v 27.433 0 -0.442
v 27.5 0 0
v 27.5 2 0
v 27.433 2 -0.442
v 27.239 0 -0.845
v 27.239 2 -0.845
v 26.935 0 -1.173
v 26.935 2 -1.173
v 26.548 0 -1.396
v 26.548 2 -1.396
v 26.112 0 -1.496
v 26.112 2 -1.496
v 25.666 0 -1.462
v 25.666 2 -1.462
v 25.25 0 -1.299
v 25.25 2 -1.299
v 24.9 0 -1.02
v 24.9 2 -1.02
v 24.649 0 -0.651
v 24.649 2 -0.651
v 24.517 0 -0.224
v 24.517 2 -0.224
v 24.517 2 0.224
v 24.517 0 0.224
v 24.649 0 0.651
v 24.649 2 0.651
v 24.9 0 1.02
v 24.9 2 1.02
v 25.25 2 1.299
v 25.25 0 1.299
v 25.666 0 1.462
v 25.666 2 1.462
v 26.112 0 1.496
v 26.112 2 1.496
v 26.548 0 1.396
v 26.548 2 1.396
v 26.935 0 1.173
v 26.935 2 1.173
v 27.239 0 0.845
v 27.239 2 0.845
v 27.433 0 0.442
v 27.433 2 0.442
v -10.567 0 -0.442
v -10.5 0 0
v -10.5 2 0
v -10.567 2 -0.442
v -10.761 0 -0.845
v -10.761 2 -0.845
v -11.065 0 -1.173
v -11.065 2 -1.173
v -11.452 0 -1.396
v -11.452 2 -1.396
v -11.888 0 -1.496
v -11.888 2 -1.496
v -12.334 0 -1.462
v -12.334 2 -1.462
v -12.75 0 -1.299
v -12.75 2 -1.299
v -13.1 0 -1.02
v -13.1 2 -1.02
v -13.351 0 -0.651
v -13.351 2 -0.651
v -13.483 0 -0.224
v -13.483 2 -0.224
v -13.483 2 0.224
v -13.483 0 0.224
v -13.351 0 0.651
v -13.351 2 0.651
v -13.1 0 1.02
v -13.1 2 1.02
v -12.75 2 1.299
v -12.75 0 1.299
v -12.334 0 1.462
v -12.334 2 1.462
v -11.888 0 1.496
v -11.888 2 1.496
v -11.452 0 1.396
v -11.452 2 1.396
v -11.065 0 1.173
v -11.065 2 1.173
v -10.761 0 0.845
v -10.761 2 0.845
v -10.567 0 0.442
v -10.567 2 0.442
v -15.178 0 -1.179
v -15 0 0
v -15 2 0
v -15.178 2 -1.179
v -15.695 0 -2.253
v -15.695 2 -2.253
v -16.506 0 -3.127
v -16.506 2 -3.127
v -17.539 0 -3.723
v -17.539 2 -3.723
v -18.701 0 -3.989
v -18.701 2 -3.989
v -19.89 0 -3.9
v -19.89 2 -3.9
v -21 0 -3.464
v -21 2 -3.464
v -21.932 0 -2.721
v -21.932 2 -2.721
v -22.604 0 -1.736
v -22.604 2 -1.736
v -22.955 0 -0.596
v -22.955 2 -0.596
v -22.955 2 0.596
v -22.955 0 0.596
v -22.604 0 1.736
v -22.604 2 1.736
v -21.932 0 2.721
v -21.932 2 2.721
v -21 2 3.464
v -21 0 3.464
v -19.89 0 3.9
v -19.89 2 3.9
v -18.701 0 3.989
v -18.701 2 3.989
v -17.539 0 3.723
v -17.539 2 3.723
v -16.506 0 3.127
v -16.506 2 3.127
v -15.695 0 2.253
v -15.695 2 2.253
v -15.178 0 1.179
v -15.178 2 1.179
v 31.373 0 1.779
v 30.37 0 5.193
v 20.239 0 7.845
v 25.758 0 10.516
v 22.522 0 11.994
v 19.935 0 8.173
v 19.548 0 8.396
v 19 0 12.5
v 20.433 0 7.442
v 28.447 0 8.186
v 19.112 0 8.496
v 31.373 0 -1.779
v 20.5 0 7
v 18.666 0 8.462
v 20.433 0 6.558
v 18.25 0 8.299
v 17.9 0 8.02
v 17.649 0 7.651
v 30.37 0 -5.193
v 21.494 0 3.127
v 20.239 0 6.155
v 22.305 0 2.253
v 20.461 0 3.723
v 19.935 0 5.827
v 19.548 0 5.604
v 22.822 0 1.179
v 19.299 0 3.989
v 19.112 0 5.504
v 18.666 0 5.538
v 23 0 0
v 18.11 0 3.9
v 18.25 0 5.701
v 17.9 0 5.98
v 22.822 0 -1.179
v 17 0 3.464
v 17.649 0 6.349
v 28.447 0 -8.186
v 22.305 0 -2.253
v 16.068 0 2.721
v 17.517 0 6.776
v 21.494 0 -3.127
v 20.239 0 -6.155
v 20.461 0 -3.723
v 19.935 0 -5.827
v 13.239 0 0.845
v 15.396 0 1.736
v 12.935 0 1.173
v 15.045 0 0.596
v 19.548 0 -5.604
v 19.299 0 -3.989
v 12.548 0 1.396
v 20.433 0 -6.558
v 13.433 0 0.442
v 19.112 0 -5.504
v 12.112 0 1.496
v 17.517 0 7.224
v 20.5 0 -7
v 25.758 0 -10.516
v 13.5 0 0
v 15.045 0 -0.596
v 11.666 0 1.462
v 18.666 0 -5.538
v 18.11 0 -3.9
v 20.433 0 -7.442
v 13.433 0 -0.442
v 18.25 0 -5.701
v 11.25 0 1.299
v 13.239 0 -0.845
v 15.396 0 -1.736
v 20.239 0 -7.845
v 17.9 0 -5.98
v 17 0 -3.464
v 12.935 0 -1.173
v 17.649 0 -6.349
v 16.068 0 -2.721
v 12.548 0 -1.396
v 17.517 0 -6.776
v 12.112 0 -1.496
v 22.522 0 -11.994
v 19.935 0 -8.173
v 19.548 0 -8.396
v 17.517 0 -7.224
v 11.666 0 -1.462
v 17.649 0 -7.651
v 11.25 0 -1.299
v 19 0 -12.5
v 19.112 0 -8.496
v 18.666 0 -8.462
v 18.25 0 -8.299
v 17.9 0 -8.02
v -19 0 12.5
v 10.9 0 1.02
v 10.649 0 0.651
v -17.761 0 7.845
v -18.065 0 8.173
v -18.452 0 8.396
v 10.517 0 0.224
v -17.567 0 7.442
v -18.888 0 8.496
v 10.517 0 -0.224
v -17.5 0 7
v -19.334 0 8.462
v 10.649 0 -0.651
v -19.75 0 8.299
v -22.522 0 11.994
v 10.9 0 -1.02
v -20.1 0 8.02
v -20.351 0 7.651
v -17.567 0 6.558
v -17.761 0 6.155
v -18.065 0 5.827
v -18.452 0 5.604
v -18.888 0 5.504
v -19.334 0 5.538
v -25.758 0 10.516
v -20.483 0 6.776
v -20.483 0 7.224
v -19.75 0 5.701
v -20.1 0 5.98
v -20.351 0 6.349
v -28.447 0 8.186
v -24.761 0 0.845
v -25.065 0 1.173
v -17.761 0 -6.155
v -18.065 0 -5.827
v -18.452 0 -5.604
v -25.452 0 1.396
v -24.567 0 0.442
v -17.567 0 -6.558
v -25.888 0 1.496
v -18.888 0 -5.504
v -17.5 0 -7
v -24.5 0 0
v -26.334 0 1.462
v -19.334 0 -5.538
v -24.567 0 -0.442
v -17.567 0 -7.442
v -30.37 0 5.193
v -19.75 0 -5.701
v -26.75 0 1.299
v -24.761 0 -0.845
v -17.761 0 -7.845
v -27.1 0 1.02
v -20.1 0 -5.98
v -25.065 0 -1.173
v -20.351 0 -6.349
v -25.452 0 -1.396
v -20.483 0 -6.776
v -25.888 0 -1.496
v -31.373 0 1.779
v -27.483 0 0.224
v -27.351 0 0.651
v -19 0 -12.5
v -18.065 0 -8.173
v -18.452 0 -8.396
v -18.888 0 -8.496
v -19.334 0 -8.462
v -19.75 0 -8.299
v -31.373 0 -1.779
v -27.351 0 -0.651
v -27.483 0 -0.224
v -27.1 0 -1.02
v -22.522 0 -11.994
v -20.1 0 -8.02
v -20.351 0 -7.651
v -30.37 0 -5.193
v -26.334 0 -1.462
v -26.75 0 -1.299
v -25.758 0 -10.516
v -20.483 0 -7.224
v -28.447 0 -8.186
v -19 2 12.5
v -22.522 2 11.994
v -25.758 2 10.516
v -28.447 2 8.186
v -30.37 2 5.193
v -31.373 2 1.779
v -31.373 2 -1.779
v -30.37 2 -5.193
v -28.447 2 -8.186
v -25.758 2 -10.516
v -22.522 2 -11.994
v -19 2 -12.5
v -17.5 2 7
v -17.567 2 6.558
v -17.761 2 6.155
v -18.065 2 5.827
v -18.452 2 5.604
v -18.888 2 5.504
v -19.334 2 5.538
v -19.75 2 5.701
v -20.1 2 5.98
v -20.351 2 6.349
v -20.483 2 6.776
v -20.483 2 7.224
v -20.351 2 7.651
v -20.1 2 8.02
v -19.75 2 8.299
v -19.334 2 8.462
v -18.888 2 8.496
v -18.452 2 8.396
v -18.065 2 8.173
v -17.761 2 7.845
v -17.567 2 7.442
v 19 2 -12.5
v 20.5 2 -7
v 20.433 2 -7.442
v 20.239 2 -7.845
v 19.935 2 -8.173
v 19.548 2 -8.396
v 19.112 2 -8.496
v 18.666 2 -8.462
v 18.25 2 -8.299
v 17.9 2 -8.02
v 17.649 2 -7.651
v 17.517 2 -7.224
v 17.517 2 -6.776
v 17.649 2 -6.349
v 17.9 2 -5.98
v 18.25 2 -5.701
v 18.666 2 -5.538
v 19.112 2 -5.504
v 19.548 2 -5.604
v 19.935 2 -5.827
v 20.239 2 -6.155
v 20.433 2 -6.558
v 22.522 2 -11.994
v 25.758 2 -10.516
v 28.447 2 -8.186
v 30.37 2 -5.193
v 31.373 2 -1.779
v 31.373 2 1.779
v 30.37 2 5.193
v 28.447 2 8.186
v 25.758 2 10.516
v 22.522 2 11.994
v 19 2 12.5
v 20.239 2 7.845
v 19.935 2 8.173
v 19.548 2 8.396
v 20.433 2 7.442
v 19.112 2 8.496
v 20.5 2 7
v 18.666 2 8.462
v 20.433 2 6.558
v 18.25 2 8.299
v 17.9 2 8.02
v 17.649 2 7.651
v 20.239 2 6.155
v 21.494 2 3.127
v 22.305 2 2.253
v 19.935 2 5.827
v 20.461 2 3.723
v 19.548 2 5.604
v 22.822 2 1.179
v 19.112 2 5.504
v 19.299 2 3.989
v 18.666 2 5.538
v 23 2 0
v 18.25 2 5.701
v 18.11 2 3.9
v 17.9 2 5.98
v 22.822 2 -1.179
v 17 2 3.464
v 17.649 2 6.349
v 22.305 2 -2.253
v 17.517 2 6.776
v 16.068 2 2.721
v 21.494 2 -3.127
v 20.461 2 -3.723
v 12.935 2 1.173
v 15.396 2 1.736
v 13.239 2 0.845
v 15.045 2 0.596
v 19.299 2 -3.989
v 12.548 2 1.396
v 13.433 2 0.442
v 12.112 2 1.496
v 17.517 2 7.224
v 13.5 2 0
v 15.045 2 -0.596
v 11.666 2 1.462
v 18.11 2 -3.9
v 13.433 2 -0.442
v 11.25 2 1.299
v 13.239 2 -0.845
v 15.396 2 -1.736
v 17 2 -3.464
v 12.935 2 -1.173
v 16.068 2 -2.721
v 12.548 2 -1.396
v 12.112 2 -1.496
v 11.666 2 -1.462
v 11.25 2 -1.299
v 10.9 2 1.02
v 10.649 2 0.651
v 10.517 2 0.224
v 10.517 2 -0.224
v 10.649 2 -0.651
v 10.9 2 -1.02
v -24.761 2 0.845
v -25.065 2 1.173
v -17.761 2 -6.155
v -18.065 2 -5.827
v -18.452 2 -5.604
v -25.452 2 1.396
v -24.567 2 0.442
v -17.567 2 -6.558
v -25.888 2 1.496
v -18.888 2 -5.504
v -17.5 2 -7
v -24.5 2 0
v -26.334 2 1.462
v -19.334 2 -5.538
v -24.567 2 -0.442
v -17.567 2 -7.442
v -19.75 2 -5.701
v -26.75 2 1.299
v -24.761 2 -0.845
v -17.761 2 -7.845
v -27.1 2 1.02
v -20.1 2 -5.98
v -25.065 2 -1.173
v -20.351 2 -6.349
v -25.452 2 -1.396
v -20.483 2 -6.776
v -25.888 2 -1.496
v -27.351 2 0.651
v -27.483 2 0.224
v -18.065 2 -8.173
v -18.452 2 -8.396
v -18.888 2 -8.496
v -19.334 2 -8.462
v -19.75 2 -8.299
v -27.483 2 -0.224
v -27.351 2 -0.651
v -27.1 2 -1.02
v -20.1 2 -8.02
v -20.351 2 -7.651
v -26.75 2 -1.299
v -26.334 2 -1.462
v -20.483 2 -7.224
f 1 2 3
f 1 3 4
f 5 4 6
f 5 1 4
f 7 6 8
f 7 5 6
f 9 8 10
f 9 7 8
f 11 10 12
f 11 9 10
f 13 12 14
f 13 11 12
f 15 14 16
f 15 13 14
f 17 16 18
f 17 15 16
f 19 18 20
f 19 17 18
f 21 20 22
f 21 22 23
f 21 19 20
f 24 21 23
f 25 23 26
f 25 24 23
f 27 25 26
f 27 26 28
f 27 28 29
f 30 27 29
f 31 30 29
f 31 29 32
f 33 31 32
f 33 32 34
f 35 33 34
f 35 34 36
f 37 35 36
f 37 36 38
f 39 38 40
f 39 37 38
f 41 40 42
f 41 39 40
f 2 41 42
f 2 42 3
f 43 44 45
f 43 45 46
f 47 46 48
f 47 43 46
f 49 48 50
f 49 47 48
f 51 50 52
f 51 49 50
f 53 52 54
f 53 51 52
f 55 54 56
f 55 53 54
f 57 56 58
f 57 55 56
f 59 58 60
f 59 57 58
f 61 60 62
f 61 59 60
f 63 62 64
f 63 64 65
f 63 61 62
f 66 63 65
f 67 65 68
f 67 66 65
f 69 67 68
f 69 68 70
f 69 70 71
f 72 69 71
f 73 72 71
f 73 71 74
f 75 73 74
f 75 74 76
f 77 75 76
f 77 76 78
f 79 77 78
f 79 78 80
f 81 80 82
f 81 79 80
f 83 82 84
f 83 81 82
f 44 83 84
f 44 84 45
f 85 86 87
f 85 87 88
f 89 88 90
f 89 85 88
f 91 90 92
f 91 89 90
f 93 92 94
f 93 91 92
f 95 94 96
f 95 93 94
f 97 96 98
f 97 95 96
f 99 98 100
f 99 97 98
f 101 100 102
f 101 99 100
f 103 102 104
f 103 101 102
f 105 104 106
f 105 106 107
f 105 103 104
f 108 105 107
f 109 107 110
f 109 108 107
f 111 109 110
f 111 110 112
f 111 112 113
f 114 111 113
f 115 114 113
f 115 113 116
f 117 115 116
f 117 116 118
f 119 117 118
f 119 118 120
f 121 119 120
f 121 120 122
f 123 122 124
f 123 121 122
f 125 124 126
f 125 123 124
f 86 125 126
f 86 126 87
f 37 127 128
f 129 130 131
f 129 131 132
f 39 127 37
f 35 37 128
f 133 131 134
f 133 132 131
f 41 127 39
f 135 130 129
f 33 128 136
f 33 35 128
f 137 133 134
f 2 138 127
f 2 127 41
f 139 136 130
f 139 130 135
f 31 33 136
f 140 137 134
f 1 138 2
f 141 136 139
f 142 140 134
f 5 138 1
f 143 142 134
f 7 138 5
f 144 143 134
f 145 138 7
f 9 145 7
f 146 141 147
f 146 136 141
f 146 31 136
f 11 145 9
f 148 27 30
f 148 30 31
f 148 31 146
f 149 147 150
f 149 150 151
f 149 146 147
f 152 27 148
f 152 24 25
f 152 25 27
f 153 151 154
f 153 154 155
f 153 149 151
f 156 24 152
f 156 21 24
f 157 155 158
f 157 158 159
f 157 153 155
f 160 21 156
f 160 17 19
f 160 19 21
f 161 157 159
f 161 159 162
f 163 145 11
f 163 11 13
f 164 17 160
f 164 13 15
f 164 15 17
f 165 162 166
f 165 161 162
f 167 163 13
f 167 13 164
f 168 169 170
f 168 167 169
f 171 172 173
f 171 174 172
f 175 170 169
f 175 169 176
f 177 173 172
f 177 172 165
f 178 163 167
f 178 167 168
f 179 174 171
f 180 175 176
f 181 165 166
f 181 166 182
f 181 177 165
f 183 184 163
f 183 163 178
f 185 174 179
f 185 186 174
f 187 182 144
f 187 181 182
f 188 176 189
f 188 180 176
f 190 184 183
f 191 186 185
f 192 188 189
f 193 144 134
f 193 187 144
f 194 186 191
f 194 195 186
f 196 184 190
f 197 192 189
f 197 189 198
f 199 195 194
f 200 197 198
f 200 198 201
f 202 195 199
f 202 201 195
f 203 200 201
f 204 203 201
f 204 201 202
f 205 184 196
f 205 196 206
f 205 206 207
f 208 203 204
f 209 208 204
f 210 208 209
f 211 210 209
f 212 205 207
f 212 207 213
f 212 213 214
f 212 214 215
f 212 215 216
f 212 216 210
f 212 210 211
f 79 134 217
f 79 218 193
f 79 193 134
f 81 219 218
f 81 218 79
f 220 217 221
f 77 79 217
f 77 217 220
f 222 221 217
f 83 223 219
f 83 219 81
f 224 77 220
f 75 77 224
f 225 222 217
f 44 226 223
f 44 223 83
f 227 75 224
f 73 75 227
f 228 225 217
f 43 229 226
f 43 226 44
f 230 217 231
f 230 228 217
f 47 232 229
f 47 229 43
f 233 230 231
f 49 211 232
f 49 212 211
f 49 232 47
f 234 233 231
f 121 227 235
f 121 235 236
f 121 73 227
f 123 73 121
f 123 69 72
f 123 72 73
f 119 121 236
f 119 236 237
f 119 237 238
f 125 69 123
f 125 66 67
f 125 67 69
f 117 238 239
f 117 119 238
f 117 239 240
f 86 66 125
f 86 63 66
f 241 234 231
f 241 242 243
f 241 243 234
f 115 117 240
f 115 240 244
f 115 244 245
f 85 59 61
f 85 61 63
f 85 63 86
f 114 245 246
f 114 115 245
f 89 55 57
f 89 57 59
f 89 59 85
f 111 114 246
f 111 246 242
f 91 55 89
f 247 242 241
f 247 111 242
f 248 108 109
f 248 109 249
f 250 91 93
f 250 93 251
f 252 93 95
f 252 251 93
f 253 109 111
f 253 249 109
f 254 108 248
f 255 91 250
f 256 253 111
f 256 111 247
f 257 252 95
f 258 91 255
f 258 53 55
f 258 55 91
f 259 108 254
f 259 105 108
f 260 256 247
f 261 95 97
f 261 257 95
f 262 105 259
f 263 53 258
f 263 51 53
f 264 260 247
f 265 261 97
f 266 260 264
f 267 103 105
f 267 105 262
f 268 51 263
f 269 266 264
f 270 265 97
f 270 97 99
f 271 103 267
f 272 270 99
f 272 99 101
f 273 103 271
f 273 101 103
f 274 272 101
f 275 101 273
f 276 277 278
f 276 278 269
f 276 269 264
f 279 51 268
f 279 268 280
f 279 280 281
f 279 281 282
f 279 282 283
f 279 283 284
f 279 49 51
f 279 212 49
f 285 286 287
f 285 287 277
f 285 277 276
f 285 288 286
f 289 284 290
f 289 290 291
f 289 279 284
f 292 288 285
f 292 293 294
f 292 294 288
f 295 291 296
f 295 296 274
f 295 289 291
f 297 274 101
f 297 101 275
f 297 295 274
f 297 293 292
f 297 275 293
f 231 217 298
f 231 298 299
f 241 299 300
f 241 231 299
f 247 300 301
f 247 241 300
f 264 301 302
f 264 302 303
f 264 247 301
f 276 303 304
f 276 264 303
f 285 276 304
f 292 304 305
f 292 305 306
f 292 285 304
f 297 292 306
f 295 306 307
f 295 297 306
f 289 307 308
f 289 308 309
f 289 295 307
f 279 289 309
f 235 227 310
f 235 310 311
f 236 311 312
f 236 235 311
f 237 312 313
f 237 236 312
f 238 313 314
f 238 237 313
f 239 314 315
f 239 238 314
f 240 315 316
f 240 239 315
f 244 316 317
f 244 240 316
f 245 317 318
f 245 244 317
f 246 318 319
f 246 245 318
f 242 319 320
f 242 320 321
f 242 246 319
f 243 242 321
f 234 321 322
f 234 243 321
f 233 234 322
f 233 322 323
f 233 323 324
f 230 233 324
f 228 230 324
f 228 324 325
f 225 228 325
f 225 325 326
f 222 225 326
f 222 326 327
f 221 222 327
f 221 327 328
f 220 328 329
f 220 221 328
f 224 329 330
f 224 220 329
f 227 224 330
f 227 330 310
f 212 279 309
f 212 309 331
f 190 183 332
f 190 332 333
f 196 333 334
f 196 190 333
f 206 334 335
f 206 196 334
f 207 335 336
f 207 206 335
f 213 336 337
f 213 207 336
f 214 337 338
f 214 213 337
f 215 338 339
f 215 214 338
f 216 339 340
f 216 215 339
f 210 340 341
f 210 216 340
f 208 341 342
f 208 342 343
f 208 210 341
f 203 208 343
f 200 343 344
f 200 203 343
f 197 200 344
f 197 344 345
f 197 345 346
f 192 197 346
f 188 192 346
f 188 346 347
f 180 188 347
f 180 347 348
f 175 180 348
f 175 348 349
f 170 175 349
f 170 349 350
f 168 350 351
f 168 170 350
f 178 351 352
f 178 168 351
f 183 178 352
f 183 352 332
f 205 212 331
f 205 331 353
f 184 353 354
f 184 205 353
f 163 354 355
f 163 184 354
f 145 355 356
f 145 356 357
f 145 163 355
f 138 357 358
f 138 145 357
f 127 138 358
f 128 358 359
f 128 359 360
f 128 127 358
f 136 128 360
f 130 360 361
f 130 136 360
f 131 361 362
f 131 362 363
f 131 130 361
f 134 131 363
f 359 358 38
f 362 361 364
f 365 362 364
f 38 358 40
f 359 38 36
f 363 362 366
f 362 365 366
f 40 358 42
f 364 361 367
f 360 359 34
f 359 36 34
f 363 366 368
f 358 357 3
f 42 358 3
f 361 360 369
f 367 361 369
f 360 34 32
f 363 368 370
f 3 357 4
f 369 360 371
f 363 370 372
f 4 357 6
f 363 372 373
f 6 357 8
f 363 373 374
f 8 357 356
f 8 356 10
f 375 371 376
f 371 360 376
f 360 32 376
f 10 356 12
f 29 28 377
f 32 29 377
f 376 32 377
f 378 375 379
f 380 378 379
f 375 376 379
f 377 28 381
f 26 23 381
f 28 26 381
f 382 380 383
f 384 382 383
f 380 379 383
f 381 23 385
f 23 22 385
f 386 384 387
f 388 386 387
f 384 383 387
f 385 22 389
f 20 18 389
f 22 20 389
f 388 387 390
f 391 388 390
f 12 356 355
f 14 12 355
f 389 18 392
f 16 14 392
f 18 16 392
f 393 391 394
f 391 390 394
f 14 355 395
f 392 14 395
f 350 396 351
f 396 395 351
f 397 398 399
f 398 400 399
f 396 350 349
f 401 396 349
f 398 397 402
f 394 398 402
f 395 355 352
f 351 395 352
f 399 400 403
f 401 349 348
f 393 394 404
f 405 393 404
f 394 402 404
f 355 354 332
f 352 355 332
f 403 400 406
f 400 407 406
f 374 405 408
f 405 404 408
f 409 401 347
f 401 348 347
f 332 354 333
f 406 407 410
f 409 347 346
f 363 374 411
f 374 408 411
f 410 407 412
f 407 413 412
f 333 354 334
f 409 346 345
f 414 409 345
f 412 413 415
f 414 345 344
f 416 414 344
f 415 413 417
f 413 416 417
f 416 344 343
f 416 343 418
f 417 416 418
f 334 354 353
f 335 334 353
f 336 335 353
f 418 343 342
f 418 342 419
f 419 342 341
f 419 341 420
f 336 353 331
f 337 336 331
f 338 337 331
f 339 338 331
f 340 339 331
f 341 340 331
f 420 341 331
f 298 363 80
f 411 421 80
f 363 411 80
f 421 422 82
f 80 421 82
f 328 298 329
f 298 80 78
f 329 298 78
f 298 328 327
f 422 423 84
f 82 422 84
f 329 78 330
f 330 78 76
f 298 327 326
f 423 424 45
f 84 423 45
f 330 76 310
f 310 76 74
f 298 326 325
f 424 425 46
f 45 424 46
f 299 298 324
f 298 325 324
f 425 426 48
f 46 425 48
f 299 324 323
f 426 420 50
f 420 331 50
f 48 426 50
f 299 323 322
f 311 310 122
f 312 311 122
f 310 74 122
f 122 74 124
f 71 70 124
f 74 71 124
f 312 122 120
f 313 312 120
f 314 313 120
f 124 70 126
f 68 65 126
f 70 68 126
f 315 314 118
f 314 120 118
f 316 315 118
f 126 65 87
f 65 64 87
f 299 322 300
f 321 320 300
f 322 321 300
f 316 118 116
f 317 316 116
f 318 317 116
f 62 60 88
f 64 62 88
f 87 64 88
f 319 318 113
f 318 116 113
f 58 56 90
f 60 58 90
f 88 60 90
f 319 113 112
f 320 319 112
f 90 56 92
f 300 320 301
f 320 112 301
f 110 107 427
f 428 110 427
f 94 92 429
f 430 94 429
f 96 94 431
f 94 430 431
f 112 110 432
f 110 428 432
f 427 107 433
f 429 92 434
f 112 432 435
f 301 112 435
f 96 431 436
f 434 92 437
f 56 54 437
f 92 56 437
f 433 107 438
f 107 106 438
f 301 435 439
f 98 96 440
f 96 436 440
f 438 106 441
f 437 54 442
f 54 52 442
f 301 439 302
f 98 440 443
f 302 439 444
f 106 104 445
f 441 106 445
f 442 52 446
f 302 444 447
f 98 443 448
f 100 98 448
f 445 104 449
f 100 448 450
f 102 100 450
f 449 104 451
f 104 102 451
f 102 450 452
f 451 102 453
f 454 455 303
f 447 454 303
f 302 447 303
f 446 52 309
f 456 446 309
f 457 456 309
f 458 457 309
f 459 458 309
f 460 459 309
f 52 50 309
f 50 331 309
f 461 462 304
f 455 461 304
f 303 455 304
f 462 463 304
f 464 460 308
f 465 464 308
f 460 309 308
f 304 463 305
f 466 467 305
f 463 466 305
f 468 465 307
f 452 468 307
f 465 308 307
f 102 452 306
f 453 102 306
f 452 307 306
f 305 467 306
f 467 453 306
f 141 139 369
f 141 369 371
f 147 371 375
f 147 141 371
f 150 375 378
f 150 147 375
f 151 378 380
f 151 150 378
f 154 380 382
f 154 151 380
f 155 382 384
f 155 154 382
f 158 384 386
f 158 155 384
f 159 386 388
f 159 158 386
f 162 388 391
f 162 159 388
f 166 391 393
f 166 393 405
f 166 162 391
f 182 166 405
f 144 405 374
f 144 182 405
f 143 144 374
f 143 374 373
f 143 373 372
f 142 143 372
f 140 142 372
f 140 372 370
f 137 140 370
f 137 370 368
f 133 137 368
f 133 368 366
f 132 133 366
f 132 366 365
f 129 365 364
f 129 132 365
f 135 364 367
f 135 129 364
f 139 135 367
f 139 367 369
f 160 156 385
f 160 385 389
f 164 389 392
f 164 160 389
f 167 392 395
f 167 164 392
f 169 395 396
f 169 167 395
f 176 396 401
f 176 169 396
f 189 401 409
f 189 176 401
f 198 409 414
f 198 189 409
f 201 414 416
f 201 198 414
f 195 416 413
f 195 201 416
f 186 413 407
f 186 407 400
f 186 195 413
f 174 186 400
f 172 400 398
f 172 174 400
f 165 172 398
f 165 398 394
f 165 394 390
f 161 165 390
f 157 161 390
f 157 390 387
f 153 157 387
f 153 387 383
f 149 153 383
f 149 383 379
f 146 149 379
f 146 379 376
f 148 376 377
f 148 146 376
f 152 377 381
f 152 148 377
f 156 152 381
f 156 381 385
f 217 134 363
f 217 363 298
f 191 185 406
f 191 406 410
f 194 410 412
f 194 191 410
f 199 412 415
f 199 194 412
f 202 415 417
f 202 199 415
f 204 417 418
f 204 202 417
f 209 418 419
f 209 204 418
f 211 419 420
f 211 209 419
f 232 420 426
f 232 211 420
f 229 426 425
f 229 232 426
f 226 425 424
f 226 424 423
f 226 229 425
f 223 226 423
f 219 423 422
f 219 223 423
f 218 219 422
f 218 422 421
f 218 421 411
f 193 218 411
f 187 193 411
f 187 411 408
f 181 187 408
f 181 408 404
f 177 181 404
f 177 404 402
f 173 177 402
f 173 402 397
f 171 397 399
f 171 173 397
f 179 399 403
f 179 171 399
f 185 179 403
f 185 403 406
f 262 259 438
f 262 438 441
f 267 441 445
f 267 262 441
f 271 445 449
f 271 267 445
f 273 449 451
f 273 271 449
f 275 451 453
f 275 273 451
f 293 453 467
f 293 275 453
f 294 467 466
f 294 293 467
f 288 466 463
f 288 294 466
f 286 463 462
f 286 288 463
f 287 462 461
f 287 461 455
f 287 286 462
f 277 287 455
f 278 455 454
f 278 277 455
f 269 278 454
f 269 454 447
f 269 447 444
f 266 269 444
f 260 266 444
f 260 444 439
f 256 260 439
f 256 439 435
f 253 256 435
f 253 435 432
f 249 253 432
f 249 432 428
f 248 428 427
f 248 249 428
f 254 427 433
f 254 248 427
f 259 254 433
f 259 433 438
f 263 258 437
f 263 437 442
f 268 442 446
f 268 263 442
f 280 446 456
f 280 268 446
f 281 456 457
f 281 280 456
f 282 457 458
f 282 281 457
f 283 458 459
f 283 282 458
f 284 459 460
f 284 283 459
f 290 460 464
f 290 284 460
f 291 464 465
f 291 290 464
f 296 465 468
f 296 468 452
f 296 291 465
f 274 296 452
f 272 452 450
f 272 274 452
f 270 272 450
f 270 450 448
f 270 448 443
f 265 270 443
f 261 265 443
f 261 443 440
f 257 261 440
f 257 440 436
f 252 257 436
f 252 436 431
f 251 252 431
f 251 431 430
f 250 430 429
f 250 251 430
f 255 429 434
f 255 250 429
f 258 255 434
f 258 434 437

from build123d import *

# Parameters (mm, degrees)
SKETCH1_R           = 4
SKETCH1_R_2         = 1.5
BOSS_EXTRUDE1_DEPTH = 2


with BuildPart() as part:
    # Sketch1 → Boss-Extrude1 (new body)
    with BuildSketch(Plane(origin=(0, 0, 0), x_dir=(1, 0, 0), z_dir=(0, 1, 0))):
        with BuildLine():
            Line((19, -12.5), (-19, -12.5))
            ThreePointArc((-19, -12.5), (-31.5, 0), (-19, 12.5))
            Line((-19, 12.5), (19, 12.5))
            ThreePointArc((19, 12.5), (31.5, 0), (19, -12.5))
        make_face()
        with Locations((-19, 0)):
            Circle(SKETCH1_R, mode=Mode.SUBTRACT)
        with Locations((19, 0)):
            Circle(SKETCH1_R, mode=Mode.SUBTRACT)
        with Locations((-19, 7)):
            Circle(SKETCH1_R_2, mode=Mode.SUBTRACT)
        with Locations((-12, 0)):
            Circle(SKETCH1_R_2, mode=Mode.SUBTRACT)
        with Locations((-26, 0)):
            Circle(SKETCH1_R_2, mode=Mode.SUBTRACT)
        with Locations((-19, -7)):
            Circle(SKETCH1_R_2, mode=Mode.SUBTRACT)
        with Locations((12, 0)):
            Circle(SKETCH1_R_2, mode=Mode.SUBTRACT)
        with Locations((19, 7)):
            Circle(SKETCH1_R_2, mode=Mode.SUBTRACT)
        with Locations((26, 0)):
            Circle(SKETCH1_R_2, mode=Mode.SUBTRACT)
        with Locations((19, -7)):
            Circle(SKETCH1_R_2, mode=Mode.SUBTRACT)
    extrude(amount=BOSS_EXTRUDE1_DEPTH)


solid = part.part
